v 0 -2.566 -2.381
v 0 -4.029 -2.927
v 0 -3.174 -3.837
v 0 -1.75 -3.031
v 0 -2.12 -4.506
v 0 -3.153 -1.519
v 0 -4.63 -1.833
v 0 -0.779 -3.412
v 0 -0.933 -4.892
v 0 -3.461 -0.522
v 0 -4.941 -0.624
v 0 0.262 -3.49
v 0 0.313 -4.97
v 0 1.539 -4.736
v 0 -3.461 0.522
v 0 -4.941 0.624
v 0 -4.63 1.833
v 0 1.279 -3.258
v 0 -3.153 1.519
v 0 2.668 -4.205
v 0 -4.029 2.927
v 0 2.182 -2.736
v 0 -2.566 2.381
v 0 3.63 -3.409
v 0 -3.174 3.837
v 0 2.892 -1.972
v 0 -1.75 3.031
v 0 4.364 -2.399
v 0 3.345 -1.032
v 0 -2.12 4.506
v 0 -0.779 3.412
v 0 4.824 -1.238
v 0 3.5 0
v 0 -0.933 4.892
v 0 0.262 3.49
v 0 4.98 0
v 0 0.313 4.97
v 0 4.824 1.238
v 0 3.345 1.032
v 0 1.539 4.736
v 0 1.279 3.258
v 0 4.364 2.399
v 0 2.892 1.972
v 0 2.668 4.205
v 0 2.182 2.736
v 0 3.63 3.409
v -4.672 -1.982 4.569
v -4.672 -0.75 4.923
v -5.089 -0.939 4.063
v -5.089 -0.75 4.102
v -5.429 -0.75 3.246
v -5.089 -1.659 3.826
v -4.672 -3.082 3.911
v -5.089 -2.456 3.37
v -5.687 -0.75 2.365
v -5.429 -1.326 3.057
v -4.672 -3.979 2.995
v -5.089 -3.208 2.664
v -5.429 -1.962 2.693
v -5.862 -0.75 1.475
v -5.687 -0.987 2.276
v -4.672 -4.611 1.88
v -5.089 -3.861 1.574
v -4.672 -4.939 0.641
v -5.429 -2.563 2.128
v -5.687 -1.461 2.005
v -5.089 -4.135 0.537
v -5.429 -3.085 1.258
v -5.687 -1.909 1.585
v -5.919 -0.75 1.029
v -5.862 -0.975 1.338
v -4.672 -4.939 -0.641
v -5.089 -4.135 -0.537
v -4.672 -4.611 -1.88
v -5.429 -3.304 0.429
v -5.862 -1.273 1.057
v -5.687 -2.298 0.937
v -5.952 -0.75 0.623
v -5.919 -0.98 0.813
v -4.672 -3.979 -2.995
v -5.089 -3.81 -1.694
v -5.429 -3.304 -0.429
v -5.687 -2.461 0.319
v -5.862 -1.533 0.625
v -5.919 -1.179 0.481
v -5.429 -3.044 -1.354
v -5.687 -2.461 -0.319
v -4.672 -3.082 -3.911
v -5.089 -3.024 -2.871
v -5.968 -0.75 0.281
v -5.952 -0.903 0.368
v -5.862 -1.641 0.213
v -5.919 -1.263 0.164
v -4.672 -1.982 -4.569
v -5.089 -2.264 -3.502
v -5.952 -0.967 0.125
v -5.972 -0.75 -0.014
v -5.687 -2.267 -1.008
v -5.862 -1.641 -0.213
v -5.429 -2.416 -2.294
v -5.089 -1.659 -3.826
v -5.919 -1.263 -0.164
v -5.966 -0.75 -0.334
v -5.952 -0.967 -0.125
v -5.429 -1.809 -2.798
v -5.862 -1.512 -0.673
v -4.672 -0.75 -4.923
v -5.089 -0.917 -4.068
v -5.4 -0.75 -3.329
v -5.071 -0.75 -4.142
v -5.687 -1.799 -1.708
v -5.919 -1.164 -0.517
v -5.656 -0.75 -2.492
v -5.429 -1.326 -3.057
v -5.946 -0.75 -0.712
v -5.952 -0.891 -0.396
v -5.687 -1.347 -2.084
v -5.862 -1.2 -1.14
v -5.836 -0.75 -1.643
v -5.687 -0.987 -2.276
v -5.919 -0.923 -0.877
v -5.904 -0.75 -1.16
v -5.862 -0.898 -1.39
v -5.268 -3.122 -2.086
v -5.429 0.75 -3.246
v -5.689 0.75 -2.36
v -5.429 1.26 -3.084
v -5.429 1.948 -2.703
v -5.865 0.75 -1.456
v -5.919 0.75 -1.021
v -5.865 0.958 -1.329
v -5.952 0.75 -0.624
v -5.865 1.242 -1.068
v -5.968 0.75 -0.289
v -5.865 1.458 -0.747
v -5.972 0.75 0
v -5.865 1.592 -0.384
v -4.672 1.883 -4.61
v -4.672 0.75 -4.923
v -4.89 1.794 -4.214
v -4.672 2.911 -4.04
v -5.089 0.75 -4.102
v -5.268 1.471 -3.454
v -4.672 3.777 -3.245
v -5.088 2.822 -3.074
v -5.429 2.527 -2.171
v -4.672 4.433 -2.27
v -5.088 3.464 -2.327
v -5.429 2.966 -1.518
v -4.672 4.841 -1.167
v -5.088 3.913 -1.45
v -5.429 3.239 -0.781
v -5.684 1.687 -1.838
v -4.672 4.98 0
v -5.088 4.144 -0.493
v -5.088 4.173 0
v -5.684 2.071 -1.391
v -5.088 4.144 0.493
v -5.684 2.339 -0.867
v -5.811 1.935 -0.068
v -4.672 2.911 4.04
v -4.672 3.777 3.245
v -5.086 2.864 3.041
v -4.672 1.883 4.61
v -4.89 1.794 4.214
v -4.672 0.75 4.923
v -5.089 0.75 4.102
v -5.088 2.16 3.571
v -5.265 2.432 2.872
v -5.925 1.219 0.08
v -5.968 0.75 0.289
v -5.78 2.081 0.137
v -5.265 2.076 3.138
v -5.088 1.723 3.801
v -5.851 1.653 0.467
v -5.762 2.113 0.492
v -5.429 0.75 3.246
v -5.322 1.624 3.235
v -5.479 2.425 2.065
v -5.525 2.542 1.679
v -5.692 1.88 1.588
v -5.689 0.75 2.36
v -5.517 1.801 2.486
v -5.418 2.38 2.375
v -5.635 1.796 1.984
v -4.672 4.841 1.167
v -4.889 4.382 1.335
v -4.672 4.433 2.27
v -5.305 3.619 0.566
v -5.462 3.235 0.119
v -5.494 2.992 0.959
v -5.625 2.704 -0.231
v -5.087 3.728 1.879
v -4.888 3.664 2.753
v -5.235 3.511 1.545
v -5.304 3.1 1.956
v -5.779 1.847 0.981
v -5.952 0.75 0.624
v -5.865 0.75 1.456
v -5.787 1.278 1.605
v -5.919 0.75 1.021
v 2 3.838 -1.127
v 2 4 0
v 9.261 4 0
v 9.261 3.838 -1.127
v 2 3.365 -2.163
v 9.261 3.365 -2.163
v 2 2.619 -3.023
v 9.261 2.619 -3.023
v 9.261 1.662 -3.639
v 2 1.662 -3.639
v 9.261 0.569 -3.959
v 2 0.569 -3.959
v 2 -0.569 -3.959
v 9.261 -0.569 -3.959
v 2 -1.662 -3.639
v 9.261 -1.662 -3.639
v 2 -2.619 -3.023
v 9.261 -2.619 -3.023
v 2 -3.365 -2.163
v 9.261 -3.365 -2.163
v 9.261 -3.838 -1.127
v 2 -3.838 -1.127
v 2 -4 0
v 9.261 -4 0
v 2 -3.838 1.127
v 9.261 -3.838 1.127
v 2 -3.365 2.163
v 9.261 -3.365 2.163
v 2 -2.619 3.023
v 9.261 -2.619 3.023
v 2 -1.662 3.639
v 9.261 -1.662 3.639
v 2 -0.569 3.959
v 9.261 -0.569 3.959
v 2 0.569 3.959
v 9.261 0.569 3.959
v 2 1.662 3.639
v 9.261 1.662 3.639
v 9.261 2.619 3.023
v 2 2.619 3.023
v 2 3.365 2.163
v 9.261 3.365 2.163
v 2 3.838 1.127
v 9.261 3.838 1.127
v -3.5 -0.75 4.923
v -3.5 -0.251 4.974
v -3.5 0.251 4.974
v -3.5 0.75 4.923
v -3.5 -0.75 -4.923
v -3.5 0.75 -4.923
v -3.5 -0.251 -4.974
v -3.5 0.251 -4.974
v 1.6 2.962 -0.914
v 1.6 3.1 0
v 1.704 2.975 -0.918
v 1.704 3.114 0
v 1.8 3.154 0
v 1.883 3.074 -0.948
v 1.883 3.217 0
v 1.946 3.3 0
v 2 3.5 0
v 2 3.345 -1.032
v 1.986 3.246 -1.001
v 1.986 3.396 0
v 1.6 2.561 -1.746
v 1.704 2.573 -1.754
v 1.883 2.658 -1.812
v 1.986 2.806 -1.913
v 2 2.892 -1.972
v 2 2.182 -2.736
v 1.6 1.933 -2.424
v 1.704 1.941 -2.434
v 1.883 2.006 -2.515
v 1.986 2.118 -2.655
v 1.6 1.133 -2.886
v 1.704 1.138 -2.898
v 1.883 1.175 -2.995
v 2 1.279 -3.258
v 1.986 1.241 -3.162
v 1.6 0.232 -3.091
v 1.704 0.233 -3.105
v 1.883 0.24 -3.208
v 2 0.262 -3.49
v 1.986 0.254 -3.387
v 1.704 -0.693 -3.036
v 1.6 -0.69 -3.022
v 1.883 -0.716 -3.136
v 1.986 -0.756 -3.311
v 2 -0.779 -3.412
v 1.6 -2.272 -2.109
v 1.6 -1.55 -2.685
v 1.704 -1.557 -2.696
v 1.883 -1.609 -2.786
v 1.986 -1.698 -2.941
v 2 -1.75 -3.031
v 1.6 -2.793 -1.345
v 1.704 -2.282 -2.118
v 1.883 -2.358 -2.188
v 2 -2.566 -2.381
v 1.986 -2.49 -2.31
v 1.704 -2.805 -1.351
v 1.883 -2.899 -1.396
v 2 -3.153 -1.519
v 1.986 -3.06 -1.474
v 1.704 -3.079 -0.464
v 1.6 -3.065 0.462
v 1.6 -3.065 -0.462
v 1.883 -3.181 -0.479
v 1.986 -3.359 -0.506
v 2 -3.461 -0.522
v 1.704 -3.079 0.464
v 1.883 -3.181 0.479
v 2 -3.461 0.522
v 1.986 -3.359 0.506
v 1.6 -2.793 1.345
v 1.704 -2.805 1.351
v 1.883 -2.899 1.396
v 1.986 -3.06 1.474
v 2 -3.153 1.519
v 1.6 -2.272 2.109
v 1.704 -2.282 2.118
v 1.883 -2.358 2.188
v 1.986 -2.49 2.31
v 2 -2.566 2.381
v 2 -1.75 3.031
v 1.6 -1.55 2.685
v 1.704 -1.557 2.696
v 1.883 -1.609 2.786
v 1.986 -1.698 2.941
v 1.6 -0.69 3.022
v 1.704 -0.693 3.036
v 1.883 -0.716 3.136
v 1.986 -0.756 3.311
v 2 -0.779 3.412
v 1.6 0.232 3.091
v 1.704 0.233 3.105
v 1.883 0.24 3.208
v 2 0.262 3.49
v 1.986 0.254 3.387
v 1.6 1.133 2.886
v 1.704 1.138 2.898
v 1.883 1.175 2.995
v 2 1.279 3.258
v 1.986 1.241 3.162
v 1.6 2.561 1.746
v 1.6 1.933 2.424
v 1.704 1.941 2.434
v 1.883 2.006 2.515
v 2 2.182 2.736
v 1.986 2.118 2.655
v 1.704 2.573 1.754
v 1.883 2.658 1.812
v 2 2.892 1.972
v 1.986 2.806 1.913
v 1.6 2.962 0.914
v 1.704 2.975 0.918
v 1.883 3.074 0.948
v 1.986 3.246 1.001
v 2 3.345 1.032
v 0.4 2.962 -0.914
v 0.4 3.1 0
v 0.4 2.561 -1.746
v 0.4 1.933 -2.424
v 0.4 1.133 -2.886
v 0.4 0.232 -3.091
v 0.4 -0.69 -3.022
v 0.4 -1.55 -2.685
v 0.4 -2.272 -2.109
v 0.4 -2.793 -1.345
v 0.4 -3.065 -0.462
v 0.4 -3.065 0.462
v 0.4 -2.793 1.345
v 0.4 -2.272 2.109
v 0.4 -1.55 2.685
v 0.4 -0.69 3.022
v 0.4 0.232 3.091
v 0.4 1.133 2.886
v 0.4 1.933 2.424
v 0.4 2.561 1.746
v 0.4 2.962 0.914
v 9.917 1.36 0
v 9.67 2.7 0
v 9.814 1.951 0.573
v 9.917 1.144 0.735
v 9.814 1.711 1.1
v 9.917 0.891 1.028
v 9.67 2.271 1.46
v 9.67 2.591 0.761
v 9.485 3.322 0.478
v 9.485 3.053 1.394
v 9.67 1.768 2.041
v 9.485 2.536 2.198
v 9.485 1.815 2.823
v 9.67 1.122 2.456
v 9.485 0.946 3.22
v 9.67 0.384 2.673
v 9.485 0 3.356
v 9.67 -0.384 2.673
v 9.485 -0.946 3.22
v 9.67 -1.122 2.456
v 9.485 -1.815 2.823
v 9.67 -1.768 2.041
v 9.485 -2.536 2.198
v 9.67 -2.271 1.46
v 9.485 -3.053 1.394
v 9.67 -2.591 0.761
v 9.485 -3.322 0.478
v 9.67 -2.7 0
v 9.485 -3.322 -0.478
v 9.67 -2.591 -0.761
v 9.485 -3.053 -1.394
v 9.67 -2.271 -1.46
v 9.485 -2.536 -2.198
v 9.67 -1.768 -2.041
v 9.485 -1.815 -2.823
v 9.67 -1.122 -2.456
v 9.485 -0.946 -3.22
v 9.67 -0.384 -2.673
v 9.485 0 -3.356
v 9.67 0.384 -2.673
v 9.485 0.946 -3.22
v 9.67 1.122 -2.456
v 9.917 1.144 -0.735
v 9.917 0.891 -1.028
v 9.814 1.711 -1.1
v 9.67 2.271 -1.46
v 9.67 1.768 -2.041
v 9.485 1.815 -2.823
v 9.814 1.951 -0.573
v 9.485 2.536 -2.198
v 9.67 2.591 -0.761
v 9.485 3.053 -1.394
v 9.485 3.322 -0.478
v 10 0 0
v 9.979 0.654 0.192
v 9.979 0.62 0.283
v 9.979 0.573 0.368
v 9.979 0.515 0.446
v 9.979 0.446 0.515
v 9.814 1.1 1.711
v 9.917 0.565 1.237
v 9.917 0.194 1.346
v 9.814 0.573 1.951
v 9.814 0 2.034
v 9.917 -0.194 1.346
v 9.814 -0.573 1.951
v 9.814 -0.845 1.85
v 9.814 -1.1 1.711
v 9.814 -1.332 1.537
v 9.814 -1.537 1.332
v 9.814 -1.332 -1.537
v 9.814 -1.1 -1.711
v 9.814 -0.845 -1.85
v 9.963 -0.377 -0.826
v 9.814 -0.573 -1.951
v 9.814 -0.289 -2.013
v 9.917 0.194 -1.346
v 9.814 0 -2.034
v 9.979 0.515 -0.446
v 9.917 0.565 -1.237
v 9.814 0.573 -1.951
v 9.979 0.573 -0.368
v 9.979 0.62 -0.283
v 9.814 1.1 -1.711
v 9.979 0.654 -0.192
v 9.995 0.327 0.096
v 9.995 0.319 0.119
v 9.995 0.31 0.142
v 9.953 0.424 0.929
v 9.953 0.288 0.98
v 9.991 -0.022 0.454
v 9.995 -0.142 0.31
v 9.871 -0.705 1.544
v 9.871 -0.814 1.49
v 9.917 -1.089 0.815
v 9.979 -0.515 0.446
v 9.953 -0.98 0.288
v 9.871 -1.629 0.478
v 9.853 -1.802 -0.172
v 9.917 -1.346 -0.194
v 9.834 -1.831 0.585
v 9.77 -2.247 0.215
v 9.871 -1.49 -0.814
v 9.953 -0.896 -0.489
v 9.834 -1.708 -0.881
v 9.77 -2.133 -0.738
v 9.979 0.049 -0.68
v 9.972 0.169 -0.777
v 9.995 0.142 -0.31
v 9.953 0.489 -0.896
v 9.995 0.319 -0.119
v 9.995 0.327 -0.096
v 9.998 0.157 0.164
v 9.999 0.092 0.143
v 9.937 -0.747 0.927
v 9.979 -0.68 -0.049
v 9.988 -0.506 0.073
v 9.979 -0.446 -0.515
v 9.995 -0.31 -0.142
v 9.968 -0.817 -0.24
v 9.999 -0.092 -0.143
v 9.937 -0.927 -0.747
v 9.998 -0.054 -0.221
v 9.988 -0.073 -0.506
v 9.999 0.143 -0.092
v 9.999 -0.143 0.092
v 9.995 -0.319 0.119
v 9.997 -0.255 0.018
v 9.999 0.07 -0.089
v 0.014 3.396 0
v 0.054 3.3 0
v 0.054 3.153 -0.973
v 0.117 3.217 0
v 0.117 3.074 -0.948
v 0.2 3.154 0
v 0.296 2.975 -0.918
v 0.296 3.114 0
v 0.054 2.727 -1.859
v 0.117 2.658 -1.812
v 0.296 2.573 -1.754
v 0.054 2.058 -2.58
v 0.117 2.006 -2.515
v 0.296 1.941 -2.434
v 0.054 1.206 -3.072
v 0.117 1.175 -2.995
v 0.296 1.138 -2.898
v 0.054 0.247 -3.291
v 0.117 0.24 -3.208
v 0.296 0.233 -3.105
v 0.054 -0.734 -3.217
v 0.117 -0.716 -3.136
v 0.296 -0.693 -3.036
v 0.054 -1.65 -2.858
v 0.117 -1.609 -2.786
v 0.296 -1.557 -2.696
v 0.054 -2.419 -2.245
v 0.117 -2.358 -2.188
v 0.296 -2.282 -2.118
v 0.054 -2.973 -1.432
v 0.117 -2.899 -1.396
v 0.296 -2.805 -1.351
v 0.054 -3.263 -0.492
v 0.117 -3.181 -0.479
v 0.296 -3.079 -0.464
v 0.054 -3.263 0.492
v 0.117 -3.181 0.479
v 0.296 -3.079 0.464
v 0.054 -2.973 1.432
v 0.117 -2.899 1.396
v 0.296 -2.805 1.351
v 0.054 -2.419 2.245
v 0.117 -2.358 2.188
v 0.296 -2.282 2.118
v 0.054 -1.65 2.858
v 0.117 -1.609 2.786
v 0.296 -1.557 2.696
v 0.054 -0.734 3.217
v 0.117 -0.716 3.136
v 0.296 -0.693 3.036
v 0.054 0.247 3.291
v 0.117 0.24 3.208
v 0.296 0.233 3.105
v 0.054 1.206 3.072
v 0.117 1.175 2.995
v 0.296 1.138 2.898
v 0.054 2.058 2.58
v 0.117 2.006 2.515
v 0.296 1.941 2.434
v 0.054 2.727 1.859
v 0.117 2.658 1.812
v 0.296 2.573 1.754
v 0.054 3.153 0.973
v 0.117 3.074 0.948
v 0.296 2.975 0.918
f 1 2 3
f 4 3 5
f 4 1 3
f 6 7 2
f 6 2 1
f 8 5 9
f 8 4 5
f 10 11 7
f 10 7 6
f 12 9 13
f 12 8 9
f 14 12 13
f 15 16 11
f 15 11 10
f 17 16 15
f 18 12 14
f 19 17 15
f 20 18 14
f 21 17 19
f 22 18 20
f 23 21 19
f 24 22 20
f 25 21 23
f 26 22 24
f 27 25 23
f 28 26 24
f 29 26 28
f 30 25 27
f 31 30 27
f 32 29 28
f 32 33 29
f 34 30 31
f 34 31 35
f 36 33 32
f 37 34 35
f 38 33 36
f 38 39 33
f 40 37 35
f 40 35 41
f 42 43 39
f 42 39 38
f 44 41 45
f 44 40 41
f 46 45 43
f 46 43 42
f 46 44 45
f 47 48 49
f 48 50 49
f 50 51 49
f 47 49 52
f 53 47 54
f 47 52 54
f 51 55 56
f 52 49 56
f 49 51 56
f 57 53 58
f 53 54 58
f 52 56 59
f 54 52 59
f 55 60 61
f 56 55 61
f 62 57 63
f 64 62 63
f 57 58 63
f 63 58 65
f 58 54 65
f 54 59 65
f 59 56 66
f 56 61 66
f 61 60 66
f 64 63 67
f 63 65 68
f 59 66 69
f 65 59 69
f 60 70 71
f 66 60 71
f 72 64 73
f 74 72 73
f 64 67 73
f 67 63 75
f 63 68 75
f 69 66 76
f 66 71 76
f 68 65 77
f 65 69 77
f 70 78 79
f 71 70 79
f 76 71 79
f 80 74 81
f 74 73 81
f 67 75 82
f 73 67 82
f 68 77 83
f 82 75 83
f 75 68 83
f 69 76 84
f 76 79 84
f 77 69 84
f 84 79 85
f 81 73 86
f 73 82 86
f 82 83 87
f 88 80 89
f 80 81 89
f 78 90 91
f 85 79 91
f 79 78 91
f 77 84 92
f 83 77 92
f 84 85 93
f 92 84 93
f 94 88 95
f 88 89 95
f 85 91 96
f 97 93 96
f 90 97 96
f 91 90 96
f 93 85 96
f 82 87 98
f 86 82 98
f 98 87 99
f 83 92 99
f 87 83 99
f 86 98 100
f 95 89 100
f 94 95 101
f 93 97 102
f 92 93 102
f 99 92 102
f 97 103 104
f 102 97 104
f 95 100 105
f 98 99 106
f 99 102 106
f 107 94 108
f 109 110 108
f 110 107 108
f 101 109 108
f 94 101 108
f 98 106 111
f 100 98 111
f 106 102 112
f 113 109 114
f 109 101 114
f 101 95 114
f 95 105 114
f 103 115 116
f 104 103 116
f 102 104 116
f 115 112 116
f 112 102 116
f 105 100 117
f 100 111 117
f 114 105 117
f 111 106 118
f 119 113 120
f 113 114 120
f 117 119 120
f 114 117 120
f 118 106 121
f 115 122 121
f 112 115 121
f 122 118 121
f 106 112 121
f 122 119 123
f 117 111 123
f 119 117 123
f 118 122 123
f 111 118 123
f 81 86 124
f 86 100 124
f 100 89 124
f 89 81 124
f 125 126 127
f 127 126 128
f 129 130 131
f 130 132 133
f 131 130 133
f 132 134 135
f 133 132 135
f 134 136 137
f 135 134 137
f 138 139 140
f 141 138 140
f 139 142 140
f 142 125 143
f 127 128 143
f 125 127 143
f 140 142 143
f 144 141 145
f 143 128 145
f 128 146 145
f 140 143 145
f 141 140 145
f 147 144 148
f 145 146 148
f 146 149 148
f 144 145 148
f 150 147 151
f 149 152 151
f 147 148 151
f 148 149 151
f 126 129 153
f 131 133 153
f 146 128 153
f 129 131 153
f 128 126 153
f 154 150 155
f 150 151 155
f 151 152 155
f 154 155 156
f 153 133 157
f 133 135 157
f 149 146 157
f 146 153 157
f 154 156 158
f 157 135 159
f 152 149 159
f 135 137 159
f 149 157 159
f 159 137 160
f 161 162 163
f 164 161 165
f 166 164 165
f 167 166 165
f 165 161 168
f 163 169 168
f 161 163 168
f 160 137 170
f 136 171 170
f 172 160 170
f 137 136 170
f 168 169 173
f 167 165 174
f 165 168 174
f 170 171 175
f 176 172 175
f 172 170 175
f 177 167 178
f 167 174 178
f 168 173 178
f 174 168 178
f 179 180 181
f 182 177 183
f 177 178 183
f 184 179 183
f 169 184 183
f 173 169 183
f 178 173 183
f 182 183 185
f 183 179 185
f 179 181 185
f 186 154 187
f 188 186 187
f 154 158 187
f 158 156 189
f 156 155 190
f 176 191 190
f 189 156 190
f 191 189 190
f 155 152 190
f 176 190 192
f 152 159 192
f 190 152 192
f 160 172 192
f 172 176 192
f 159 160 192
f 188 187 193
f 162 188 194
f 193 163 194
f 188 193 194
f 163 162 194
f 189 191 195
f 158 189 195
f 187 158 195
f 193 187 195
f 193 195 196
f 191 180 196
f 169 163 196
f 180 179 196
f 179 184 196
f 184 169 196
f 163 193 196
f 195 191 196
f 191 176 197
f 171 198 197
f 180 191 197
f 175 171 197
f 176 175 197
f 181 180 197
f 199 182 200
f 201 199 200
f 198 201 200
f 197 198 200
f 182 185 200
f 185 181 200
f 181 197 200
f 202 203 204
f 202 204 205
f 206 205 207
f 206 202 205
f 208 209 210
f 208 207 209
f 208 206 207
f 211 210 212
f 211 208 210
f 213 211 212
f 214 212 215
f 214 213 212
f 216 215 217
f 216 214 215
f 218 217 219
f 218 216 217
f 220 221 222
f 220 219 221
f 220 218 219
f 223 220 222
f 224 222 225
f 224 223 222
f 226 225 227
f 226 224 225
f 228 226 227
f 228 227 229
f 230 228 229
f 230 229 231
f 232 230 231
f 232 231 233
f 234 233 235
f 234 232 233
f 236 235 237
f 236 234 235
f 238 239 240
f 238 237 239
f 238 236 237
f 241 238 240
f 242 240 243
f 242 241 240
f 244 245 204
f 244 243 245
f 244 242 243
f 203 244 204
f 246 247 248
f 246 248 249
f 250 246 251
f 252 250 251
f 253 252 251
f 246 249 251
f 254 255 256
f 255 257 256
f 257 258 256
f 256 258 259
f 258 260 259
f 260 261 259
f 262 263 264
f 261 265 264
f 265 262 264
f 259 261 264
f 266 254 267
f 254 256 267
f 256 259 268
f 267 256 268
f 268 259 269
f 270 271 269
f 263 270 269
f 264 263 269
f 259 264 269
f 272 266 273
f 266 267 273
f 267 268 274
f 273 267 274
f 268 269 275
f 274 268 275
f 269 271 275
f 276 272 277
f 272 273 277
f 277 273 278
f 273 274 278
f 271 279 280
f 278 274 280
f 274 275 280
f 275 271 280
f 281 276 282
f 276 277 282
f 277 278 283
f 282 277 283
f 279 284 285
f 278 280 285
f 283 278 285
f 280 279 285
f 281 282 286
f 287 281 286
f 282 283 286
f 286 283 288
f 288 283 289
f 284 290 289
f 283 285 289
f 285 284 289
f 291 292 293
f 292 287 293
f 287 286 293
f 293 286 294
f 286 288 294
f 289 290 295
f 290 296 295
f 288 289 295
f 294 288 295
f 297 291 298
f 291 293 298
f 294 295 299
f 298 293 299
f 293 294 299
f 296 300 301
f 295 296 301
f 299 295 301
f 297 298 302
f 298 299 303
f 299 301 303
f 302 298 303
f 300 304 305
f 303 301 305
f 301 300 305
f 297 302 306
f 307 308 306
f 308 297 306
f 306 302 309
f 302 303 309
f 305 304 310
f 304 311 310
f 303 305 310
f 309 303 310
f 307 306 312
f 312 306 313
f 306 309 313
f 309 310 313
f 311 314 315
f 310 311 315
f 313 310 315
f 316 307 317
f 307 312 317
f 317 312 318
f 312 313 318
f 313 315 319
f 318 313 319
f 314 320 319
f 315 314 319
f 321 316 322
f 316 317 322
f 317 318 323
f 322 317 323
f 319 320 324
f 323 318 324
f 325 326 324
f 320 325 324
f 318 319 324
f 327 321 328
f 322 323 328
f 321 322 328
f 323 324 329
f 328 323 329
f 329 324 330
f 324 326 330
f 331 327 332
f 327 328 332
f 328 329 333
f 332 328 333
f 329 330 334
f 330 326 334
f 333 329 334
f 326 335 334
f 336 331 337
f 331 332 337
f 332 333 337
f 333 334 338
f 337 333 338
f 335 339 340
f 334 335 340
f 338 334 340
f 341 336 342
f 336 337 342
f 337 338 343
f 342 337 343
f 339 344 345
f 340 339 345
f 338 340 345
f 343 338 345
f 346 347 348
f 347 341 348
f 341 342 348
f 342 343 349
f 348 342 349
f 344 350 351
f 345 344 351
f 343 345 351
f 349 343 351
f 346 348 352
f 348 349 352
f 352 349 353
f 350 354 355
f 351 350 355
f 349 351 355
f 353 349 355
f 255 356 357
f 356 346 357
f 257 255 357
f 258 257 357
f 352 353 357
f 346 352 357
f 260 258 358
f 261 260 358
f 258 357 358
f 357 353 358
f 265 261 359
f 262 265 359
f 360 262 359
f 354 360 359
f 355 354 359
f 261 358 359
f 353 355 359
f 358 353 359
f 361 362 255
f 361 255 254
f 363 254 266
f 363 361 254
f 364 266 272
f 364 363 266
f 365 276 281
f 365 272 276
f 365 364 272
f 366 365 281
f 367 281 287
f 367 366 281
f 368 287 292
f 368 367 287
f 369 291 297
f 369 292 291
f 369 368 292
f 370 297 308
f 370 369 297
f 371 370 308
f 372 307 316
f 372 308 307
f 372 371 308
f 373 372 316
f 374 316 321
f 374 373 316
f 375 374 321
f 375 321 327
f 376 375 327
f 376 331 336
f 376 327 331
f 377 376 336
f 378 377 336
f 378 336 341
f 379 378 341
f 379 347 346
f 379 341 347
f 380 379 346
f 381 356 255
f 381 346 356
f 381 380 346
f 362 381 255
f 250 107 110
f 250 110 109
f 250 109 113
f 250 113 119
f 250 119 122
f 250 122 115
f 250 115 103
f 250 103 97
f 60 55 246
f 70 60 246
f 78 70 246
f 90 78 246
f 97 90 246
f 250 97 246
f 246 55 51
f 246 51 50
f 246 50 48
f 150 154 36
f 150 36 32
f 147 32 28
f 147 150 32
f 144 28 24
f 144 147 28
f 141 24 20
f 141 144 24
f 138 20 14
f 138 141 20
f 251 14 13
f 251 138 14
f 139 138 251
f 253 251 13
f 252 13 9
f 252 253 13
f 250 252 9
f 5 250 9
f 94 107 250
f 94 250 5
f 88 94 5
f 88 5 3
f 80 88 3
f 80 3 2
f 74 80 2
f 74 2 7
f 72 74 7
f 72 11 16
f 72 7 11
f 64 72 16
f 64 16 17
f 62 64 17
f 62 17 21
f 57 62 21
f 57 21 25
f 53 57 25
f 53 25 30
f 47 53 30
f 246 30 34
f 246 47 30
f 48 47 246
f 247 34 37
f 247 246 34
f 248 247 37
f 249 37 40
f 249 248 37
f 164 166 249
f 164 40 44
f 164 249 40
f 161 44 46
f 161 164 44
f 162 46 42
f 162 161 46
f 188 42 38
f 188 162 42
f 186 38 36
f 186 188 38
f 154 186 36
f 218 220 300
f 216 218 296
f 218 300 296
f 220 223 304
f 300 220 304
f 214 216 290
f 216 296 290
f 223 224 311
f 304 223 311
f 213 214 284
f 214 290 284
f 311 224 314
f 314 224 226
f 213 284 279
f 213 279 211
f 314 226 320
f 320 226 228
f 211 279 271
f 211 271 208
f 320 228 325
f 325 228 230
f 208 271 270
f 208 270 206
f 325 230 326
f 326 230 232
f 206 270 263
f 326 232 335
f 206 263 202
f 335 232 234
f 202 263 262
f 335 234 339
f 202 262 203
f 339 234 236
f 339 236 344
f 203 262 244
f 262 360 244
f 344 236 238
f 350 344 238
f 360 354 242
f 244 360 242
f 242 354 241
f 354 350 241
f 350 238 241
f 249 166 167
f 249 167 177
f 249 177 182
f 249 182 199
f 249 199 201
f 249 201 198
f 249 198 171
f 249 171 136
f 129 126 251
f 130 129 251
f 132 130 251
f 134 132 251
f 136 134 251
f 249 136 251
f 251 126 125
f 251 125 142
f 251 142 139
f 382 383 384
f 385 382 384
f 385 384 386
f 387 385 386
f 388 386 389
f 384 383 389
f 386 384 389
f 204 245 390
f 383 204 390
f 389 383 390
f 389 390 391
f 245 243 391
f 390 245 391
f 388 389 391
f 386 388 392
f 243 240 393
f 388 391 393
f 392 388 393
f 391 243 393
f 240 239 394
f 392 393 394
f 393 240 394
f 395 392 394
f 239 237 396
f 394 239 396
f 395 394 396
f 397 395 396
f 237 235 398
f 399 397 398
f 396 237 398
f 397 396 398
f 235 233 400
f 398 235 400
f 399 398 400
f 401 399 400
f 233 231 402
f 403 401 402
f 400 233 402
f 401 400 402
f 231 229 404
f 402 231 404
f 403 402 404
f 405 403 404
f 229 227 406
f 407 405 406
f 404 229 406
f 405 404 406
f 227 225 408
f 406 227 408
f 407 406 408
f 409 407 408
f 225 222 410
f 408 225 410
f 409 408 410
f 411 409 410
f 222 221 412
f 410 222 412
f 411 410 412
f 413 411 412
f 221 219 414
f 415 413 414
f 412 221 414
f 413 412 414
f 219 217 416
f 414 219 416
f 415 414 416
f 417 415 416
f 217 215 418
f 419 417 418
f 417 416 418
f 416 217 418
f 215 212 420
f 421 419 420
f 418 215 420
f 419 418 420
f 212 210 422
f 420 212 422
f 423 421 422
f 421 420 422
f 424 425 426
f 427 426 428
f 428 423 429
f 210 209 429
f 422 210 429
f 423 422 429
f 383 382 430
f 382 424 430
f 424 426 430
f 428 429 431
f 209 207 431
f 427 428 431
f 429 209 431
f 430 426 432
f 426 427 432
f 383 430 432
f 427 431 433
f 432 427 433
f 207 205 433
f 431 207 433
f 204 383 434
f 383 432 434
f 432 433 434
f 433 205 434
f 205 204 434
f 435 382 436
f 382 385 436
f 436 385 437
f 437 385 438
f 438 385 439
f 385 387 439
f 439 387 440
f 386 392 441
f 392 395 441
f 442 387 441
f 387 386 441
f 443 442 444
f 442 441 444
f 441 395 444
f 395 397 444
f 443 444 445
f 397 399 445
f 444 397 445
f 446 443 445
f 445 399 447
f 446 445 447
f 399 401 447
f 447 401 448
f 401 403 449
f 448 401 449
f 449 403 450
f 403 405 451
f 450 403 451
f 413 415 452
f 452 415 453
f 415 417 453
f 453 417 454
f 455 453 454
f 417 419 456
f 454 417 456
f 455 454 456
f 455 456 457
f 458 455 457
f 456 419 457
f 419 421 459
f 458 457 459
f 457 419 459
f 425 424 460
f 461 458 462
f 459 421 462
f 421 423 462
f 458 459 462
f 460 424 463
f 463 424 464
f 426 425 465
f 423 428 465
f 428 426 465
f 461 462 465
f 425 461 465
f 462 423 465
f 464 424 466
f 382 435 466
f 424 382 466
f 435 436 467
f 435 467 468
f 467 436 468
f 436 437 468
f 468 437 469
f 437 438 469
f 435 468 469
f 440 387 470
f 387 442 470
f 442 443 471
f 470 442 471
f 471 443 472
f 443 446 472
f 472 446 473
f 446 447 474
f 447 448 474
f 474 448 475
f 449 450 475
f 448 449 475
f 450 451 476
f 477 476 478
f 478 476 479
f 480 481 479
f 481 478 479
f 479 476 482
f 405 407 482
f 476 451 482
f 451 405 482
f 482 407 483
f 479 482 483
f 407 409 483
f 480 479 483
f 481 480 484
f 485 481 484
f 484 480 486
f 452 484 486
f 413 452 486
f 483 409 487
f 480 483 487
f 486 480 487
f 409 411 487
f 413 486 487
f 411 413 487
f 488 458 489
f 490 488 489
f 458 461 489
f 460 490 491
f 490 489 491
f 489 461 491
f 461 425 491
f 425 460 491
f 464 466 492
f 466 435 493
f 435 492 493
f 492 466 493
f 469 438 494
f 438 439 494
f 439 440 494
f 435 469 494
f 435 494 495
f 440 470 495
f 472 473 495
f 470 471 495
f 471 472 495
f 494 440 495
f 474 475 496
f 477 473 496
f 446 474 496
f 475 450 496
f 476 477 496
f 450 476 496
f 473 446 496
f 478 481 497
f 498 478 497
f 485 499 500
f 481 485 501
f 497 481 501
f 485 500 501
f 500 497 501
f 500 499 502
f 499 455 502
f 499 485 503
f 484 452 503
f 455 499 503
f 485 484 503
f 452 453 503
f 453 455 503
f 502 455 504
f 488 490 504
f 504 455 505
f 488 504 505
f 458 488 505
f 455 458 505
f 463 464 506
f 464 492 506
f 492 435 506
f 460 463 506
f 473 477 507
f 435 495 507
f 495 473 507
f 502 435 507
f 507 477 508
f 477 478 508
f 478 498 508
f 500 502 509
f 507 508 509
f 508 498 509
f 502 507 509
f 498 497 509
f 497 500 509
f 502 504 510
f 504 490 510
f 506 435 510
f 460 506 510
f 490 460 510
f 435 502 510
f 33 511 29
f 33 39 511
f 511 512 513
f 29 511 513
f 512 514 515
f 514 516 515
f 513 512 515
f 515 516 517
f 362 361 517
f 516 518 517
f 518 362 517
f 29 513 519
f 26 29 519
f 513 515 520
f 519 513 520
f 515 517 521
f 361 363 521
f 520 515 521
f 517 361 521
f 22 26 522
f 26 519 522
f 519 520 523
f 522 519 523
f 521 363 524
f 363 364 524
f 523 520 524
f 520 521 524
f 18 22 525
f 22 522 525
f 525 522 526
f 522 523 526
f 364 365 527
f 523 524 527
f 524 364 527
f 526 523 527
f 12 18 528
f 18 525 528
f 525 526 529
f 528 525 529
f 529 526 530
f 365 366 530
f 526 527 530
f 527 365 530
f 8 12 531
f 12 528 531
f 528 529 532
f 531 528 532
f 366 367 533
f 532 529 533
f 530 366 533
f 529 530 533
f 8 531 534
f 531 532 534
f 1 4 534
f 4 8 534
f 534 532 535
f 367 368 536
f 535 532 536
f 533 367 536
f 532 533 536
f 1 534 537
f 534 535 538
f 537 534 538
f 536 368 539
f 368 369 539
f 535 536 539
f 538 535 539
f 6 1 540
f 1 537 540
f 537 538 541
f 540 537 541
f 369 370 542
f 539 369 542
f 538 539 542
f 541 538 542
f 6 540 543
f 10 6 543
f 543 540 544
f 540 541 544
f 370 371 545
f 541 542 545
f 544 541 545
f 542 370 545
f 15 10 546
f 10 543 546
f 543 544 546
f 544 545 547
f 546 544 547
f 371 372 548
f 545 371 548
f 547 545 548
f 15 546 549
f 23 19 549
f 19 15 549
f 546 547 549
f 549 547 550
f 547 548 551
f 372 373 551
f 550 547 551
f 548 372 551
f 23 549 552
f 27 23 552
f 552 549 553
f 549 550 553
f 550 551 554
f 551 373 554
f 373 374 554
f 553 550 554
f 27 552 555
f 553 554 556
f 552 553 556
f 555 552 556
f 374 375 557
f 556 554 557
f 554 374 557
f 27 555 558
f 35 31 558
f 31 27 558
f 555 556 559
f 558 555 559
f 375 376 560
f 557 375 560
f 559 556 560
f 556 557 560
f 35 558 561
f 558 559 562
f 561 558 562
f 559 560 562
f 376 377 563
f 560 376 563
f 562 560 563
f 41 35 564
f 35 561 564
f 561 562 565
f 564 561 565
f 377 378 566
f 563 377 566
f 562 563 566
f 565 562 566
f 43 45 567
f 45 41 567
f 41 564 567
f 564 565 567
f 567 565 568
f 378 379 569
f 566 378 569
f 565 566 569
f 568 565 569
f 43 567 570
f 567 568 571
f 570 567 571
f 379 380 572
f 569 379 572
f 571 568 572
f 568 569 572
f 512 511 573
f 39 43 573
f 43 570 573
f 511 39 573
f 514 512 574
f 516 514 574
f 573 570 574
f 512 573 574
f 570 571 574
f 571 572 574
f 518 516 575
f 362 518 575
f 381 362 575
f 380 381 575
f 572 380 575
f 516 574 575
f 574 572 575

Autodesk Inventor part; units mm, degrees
ref_plane "YZ Plane" through (0, 0, 0) normal (1, 0, 0) x (0, 1, 0)
sketch "草图1" plane through (0, 0, 0) normal (0, 0, 1) x (1, 0, 0)
  line L0 (-9.6282, 0) -> (13.485, 0) projected
  line L1 (0, -1.0134) -> (0, 6.0805) projected
  line L2 (-6, 0) -> (10, 0)
  line L3 (10, 0) -> (10, 4)
  line L4 (10, 4) -> (0, 4)
  line L5 (0, 4) -> (0, 4.98)
  line L6 (0, 4.98) -> (-4.6718, 4.98)
  arc A0 (-4.6718, 4.98) -> (-6, 0) centre (4, 0) ccw
  line L7 (0, 4) -> (2, 4)
  line L8 (2, 3.1) -> (0, 3.1) construction
  line L9 (0, 4.35) -> (0, 4)
  line L10 (0, 4.35) -> (0, 3.1) construction
  line L11 (2, 4.35) -> (2, 3.1) construction
  arc A1 (10, 0) -> (9.2614, 4) centre (-1.2, 0) ccw
  line L12 (2, 4) -> (2, 3.5)
  line L13 (1.6, 3.1) -> (0.4, 3.1)
  line L14 (0, 3.5) -> (0, 4)
  arc A2 (0, 3.5) -> (0.4, 3.1) centre (0.4, 3.5) ccw
  arc A3 (1.6, 3.1) -> (2, 3.5) centre (1.6, 3.5) ccw
  dimension "d0" = 10
  dimension "d1" = 6
  dimension "d2" = 8
  dimension "d3" = 9.96
  dimension "d4" = 10
  dimension "d10" = 6.2
  dimension "d11" = 2
  dimension "d12" = 11.2
  dimension "d23" = 0.4
revolve "轴承体" add sketch "草图1" angle 360 about axis through (-6, 0, 0) along (1, 0, 0)
ref_plane "Work Plane1" through (-6, 0, 0) normal (1, 0, 0) x (0, 0, -1)
sketch "草图2" plane through (-6, 0, 0) normal (1, 0, 0) x (0, 0, -1)
  circle A0 centre (0, 0) radius 4.98 projected
  line L0 (0, -6.972) -> (0, 6.972) projected
  line L1 (6.972, 0) -> (-6.972, 0) projected
  line L2 (-4.98, 0.75) -> (4.98, 0.75)
  line L3 (4.98, 0.75) -> (4.98, -0.75)
  line L4 (4.98, -0.75) -> (-4.98, -0.75)
  line L5 (-4.98, -0.75) -> (-4.98, 0.75)
  line L6 (-4.98, 0) -> (4.98, 0) construction
  line L7 (0, 0.75) -> (0, -0.75) construction
  dimension "d7" = 1.5
extrude "开槽" cut sketch "草图2" along normal blind 2.5 contours L1 L0 L2 A0 | L3 L4 A0 | A0 L4 L0 L1 | A0 L2 L3 | L1 A0 L2 L0 | L0 L4 A0 L1 | L5 L2 A0 | A0 L4 L5
thread "螺纹" size "M8x1.25" designation "M8" class "6g" standard "GB Metric profile" length 10
revolve "圆角1" cut sketch "草图1" angle 360 about axis through (-6, 0, 0) along (1, 0, 0) contours A1 L4 L3
revolve "沟槽1" cut sketch "草图1" angle 360 about axis through (-6, 0, 0) along (1, 0, 0) contours L1 L4 L12 A3 L13 A2
ref_plane "Work Plane2" through (5, 0, 0) normal (0, 0, -1) x (1, 0, 0)
equation "\"d7\" = SBR"
equation "\"d8\" = STI"
equation "\"d0\" = GEL"
equation "\"d1\" = SHL"
equation "\"d2\" = NND"
equation "\"d3\" = KOD"
equation "\"d4\" = KR"
equation "\"d10\" = GDM"
equation "\"d11\" = GAL"
equation "\"d12\" = 1.4 * NND"
equation "\"d23\" = R1"
equation "\"d13\" = GEL"
equation "\"NND\" = 8"
equation "\"GEL\" = KR"
equation "\"KOD\" = 9.96"
equation "\"STI\" = 2.5"
equation "\"SBR\" = 1.5"
equation "\"GAL\" = 2"
equation "\"KR\" = 10"
equation "\"BDM\" = 9.96"
equation "\"GDM\" = 6.2"
equation "\"SHL\" = KOH"
equation "\"d6\" = -SHL"
equation "\"R1\" = 0.4"
equation "\"GUL\" = 0.61345 * PTC"
equation "\"KOH\" = 6"
equation "\"THREADDIA\" = 8"
equation "\"TOA\" = 30deg"
equation "\"NLG\" = 16"
equation "\"PTC\" = 1.25"
equation "\"RR1\" = 8"
equation "\"GD1\" = THREADDIA - 1.2269 * PTC"
properties part number "螺钉 GB 831 M8 x 6" material "钢，软"
